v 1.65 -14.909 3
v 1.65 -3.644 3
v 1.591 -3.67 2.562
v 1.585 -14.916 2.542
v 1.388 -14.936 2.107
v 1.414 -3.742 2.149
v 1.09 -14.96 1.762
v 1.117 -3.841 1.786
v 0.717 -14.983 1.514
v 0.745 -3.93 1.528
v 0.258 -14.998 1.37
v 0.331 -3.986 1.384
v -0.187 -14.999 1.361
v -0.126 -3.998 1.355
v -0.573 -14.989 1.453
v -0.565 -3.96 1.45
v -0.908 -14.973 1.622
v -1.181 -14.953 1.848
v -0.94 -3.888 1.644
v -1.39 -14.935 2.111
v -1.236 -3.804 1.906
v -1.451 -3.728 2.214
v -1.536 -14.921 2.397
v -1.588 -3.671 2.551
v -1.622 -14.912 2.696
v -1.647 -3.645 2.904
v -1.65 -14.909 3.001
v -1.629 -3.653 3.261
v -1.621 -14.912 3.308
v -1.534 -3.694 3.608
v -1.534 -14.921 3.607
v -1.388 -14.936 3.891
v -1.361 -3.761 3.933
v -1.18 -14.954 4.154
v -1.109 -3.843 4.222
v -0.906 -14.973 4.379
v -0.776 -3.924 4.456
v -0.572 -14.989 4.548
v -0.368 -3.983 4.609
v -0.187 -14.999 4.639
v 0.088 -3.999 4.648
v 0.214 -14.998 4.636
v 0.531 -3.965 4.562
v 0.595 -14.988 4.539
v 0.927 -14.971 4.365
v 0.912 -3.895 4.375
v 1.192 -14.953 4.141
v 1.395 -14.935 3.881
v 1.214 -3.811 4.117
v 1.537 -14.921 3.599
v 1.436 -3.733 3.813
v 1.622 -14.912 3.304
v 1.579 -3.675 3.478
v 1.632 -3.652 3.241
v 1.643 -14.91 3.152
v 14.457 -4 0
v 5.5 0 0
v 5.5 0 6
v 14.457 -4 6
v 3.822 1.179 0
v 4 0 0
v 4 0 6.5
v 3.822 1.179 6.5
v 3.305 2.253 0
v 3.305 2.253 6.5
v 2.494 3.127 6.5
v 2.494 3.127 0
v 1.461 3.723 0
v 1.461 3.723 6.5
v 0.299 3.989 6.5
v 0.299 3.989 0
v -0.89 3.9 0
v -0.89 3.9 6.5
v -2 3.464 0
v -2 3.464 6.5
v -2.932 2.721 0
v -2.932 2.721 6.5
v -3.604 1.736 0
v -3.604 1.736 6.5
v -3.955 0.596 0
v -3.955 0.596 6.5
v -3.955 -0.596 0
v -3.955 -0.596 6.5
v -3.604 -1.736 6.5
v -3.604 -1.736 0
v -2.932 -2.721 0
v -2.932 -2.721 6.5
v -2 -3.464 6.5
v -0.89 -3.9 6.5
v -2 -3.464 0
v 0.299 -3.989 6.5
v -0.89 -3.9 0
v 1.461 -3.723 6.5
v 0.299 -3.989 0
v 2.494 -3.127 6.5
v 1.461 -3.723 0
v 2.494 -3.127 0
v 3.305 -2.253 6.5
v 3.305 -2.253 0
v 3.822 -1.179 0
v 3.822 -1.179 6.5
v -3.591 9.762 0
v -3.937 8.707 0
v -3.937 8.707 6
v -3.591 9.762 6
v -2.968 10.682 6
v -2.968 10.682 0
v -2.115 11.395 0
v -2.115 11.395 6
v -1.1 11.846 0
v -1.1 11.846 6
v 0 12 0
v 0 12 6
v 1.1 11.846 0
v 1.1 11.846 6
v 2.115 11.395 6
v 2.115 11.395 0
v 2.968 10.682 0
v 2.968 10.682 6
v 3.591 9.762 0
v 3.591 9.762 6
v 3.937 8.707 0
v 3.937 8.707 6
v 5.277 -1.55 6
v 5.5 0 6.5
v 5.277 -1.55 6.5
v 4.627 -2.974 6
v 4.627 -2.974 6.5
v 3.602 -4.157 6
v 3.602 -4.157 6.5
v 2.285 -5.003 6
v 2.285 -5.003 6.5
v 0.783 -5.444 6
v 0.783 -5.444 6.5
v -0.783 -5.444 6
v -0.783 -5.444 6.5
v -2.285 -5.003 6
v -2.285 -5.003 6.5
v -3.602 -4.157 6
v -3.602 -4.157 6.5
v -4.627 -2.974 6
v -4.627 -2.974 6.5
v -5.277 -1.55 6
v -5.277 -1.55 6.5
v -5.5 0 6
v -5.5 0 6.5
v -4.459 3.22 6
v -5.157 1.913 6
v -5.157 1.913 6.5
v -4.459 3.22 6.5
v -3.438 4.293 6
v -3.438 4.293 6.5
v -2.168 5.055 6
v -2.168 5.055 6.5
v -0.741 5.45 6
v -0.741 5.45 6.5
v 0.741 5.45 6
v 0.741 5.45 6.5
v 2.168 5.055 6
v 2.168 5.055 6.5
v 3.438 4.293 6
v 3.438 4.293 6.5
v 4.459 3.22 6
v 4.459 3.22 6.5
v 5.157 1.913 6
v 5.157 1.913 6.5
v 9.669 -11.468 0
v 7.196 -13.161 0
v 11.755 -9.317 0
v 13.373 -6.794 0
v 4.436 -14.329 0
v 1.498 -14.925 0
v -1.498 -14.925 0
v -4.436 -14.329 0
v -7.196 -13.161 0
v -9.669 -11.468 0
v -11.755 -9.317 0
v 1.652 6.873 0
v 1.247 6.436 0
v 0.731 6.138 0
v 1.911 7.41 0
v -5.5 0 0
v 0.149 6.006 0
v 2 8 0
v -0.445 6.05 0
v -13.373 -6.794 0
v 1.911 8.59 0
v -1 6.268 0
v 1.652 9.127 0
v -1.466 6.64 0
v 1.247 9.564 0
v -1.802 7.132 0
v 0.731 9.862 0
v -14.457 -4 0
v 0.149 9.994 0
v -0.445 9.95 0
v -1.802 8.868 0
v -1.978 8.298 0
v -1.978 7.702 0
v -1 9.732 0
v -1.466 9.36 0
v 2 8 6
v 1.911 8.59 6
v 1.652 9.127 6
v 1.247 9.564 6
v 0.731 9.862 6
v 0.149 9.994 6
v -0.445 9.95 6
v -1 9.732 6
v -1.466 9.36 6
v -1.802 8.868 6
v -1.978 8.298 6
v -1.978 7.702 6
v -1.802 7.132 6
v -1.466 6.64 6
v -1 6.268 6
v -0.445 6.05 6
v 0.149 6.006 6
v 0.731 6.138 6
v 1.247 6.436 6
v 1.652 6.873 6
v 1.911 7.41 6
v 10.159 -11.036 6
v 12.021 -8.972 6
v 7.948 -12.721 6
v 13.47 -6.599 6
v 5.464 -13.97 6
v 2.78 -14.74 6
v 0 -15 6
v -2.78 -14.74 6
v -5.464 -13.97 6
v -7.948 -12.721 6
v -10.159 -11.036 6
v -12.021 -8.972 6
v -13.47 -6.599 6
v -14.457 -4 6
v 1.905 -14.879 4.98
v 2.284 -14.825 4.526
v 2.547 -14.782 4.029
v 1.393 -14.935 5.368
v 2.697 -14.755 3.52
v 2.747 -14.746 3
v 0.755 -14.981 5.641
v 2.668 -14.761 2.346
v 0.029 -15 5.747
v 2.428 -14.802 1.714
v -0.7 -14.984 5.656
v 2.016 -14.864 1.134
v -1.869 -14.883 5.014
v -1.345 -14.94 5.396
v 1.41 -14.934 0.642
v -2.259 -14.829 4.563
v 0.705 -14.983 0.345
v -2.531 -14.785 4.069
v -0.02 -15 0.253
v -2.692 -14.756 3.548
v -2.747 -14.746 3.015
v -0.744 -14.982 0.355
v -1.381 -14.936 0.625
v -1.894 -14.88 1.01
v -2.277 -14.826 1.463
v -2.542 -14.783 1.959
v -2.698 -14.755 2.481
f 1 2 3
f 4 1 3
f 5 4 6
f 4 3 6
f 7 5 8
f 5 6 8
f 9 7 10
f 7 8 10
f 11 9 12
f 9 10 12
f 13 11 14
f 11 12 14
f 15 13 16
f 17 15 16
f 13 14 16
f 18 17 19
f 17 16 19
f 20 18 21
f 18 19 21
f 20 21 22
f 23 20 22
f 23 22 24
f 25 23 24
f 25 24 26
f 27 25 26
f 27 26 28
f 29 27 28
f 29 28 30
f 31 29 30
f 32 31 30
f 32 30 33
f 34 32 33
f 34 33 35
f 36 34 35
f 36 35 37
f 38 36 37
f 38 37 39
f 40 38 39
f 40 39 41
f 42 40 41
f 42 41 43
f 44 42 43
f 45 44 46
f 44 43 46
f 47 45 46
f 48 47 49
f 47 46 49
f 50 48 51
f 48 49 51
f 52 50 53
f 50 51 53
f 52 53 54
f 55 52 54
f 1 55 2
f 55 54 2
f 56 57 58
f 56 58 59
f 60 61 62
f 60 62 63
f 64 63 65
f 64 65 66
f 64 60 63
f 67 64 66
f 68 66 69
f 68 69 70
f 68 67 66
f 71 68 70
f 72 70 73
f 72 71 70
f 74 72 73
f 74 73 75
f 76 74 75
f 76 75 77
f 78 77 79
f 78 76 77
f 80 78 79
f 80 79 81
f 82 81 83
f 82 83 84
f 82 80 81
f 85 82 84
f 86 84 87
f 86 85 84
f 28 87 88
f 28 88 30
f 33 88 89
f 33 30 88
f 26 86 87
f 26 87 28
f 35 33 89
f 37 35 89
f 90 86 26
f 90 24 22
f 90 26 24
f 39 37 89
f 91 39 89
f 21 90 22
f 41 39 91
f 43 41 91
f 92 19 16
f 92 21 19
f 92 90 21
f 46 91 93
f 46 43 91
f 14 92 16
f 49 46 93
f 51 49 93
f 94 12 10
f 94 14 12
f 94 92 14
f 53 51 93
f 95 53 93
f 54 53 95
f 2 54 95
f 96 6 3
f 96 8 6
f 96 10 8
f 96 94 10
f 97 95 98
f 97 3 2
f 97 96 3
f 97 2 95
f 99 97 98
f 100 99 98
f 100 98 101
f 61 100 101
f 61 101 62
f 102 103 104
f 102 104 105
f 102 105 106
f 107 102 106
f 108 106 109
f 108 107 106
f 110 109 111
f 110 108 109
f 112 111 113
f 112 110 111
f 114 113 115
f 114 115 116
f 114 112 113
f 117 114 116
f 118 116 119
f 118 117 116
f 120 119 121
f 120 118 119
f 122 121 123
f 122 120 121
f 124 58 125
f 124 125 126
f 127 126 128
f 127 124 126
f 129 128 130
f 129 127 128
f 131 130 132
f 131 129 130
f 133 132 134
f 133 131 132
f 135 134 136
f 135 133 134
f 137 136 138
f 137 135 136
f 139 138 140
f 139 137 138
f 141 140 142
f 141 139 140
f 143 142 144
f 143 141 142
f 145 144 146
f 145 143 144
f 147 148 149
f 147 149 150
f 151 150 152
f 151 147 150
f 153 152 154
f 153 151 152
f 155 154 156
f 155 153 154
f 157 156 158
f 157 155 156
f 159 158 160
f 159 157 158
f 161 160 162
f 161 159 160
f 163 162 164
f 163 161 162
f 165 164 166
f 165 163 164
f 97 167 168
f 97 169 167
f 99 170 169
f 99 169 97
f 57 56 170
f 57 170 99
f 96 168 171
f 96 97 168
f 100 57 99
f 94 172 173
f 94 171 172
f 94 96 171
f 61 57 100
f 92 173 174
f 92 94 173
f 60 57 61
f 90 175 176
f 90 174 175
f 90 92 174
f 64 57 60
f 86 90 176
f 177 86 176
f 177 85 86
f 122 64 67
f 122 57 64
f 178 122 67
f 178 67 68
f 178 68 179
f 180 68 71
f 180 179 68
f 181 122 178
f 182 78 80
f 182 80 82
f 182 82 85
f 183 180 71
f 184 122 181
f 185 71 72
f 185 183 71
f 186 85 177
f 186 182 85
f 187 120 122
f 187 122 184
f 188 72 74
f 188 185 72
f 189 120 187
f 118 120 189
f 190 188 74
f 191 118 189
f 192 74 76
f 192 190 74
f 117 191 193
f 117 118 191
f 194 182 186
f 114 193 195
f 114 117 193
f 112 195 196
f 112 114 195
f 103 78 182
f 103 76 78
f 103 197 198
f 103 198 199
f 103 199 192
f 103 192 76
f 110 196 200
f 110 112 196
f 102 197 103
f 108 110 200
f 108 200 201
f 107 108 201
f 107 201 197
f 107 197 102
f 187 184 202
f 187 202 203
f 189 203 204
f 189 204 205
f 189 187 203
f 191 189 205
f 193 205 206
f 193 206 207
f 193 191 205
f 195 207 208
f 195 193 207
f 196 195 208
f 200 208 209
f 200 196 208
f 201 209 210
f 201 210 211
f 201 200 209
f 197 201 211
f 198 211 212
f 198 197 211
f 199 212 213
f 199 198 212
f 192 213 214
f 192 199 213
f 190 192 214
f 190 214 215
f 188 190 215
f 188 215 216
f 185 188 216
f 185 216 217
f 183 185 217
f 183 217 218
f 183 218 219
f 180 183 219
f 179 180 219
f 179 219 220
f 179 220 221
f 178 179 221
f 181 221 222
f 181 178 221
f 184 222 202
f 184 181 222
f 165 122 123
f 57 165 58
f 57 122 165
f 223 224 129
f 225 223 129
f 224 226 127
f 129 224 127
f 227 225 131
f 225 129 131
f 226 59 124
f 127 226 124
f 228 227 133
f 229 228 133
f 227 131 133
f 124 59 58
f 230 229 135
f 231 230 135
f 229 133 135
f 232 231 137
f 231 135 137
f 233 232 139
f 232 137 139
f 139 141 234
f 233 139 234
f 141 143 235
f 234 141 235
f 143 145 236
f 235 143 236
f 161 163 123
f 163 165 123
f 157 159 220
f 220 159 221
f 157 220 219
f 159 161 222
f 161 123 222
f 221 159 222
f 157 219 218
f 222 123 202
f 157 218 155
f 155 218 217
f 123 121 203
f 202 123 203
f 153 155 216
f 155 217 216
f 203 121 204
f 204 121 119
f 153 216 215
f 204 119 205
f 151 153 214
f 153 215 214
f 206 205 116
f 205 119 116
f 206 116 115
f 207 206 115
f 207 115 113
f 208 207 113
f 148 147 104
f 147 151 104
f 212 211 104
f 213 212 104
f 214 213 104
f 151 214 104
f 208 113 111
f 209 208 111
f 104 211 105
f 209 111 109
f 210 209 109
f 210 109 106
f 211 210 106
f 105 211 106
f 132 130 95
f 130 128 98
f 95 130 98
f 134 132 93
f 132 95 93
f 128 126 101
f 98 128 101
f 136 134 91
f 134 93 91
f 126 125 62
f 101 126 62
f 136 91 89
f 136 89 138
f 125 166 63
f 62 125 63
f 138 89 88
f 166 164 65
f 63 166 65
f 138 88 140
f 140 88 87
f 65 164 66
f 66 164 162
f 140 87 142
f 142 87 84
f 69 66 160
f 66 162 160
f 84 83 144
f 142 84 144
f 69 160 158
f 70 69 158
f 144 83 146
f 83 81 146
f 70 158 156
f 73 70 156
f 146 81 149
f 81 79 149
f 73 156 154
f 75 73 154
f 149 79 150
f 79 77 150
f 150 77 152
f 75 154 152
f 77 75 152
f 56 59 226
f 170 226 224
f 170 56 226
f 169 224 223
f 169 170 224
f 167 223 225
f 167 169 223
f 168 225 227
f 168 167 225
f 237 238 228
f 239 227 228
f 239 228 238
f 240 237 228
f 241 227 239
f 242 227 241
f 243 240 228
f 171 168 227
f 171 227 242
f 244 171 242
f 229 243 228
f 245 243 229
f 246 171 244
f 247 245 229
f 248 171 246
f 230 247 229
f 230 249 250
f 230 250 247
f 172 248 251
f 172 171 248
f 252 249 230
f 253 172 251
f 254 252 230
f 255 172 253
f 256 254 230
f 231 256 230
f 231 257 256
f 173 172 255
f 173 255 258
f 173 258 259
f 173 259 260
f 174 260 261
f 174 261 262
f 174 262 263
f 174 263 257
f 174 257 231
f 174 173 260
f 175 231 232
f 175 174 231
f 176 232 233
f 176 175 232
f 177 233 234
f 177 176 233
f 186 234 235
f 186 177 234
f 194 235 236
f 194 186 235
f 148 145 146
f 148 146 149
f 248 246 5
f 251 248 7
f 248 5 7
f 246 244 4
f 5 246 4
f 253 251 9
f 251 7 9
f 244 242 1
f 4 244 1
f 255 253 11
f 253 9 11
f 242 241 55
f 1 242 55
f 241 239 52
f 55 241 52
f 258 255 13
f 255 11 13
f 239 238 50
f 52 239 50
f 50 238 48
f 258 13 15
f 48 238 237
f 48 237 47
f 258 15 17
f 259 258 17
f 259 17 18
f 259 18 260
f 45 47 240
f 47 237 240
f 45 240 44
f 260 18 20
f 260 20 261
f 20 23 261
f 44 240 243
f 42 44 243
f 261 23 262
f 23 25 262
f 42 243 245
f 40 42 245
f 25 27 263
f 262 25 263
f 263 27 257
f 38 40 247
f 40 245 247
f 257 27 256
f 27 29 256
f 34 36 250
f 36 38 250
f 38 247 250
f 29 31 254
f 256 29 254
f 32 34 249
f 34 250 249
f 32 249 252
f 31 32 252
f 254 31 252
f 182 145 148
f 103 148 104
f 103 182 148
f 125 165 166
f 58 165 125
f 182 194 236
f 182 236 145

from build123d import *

# Parameters (mm, degrees)
SKETCH_1_R            = 4
SKETCH_1_R_2          = 2
EXTRUDE_1_DEPTH       = 6
SKETCH_2_R            = 4
EXTRUDE_2_DEPTH       = 0.5
SKETCH_5_R            = 2.747111961
EXTRUDE_3_DEPTH       = 6.5
HOLE_WIZARD_M41_D     = 3.3
HOLE_WIZARD_M41_DEPTH = 16.499
HOLE_WIZARD_M41_TIP   = 0.991420021
CUT_EXTRUDE_1_DEPTH   = 6.5


with BuildPart() as part:
    # Эскиз1 → Бобышка-Вытянуть1 (new body)
    with BuildSketch(Plane.XY):
        with BuildLine():
            Line((-5.5, 0), (-3.937070517, 8.70673598))
            ThreePointArc((-3.937070517, 8.70673598), (0, 12), (3.937070517, 8.70673598))
            Line((3.937070517, 8.70673598), (5.5, 0))
            Line((5.5, 0), (14.456832295, -4))
            ThreePointArc((14.456832295, -4), (0, -15), (-14.456832295, -4))
            Line((-14.456832295, -4), (-5.5, 0))
        make_face()
        Circle(SKETCH_1_R, mode=Mode.SUBTRACT)
        with Locations((0, 8)):
            Circle(SKETCH_1_R_2, mode=Mode.SUBTRACT)
    extrude(amount=EXTRUDE_1_DEPTH)

    # Эскиз2 → Бобышка-Вытянуть2 (add)
    with BuildSketch(Plane.XY.offset(6)):
        with BuildLine():
            Line((5.156610425, 1.912947706), (5.5, 0))
            ThreePointArc((5.5, 0), (0, -5.5), (-5.5, 0))
            Line((-5.5, 0), (-5.156610425, 1.912947706))
            ThreePointArc((-5.156610425, 1.912947706), (0, 5.5), (5.156610425, 1.912947706))
        make_face()
        Circle(SKETCH_2_R, mode=Mode.SUBTRACT)
    extrude(amount=EXTRUDE_2_DEPTH)

    # Эскиз5 → Бобышка-Вытянуть3 (add)
    with BuildSketch(Plane(origin=(0, -10, 0), x_dir=(1, 0, 0), z_dir=(0, 1, 0))):
        with Locations((0, -3)):
            Circle(SKETCH_5_R)
    extrude(amount=-EXTRUDE_3_DEPTH)

    # Отверстие обработанное метчиком M41
    with Locations(Plane(origin=(0, -16.5, 0), x_dir=(-1, 0, 0), z_dir=(0, -1, 0))):
        with Locations((0, -3)):
            Hole(HOLE_WIZARD_M41_D / 2, depth=HOLE_WIZARD_M41_DEPTH)
            with Locations((0, 0, -(HOLE_WIZARD_M41_DEPTH + HOLE_WIZARD_M41_TIP / 2))):  # 118° drill point
                Cone(0, HOLE_WIZARD_M41_D / 2, HOLE_WIZARD_M41_TIP, mode=Mode.SUBTRACT)

    # Эскиз8 → Вырез-Вытянуть1 (cut)
    with BuildSketch(Plane.XY.offset(6)):
        with BuildLine():
            Line((-5.46363589, -13.96956273), (-5.46363589, -17.421493936))
            ThreePointArc((-5.46363589, -17.421493936), (0, -18.258142515), (5.46363589, -17.421493936))
            Line((5.46363589, -17.421493936), (5.46363589, -13.96956273))
            ThreePointArc((5.46363589, -13.96956273), (0, -15), (-5.46363589, -13.96956273))
        make_face()
    extrude(amount=-CUT_EXTRUDE_1_DEPTH, mode=Mode.SUBTRACT)


solid = part.part
